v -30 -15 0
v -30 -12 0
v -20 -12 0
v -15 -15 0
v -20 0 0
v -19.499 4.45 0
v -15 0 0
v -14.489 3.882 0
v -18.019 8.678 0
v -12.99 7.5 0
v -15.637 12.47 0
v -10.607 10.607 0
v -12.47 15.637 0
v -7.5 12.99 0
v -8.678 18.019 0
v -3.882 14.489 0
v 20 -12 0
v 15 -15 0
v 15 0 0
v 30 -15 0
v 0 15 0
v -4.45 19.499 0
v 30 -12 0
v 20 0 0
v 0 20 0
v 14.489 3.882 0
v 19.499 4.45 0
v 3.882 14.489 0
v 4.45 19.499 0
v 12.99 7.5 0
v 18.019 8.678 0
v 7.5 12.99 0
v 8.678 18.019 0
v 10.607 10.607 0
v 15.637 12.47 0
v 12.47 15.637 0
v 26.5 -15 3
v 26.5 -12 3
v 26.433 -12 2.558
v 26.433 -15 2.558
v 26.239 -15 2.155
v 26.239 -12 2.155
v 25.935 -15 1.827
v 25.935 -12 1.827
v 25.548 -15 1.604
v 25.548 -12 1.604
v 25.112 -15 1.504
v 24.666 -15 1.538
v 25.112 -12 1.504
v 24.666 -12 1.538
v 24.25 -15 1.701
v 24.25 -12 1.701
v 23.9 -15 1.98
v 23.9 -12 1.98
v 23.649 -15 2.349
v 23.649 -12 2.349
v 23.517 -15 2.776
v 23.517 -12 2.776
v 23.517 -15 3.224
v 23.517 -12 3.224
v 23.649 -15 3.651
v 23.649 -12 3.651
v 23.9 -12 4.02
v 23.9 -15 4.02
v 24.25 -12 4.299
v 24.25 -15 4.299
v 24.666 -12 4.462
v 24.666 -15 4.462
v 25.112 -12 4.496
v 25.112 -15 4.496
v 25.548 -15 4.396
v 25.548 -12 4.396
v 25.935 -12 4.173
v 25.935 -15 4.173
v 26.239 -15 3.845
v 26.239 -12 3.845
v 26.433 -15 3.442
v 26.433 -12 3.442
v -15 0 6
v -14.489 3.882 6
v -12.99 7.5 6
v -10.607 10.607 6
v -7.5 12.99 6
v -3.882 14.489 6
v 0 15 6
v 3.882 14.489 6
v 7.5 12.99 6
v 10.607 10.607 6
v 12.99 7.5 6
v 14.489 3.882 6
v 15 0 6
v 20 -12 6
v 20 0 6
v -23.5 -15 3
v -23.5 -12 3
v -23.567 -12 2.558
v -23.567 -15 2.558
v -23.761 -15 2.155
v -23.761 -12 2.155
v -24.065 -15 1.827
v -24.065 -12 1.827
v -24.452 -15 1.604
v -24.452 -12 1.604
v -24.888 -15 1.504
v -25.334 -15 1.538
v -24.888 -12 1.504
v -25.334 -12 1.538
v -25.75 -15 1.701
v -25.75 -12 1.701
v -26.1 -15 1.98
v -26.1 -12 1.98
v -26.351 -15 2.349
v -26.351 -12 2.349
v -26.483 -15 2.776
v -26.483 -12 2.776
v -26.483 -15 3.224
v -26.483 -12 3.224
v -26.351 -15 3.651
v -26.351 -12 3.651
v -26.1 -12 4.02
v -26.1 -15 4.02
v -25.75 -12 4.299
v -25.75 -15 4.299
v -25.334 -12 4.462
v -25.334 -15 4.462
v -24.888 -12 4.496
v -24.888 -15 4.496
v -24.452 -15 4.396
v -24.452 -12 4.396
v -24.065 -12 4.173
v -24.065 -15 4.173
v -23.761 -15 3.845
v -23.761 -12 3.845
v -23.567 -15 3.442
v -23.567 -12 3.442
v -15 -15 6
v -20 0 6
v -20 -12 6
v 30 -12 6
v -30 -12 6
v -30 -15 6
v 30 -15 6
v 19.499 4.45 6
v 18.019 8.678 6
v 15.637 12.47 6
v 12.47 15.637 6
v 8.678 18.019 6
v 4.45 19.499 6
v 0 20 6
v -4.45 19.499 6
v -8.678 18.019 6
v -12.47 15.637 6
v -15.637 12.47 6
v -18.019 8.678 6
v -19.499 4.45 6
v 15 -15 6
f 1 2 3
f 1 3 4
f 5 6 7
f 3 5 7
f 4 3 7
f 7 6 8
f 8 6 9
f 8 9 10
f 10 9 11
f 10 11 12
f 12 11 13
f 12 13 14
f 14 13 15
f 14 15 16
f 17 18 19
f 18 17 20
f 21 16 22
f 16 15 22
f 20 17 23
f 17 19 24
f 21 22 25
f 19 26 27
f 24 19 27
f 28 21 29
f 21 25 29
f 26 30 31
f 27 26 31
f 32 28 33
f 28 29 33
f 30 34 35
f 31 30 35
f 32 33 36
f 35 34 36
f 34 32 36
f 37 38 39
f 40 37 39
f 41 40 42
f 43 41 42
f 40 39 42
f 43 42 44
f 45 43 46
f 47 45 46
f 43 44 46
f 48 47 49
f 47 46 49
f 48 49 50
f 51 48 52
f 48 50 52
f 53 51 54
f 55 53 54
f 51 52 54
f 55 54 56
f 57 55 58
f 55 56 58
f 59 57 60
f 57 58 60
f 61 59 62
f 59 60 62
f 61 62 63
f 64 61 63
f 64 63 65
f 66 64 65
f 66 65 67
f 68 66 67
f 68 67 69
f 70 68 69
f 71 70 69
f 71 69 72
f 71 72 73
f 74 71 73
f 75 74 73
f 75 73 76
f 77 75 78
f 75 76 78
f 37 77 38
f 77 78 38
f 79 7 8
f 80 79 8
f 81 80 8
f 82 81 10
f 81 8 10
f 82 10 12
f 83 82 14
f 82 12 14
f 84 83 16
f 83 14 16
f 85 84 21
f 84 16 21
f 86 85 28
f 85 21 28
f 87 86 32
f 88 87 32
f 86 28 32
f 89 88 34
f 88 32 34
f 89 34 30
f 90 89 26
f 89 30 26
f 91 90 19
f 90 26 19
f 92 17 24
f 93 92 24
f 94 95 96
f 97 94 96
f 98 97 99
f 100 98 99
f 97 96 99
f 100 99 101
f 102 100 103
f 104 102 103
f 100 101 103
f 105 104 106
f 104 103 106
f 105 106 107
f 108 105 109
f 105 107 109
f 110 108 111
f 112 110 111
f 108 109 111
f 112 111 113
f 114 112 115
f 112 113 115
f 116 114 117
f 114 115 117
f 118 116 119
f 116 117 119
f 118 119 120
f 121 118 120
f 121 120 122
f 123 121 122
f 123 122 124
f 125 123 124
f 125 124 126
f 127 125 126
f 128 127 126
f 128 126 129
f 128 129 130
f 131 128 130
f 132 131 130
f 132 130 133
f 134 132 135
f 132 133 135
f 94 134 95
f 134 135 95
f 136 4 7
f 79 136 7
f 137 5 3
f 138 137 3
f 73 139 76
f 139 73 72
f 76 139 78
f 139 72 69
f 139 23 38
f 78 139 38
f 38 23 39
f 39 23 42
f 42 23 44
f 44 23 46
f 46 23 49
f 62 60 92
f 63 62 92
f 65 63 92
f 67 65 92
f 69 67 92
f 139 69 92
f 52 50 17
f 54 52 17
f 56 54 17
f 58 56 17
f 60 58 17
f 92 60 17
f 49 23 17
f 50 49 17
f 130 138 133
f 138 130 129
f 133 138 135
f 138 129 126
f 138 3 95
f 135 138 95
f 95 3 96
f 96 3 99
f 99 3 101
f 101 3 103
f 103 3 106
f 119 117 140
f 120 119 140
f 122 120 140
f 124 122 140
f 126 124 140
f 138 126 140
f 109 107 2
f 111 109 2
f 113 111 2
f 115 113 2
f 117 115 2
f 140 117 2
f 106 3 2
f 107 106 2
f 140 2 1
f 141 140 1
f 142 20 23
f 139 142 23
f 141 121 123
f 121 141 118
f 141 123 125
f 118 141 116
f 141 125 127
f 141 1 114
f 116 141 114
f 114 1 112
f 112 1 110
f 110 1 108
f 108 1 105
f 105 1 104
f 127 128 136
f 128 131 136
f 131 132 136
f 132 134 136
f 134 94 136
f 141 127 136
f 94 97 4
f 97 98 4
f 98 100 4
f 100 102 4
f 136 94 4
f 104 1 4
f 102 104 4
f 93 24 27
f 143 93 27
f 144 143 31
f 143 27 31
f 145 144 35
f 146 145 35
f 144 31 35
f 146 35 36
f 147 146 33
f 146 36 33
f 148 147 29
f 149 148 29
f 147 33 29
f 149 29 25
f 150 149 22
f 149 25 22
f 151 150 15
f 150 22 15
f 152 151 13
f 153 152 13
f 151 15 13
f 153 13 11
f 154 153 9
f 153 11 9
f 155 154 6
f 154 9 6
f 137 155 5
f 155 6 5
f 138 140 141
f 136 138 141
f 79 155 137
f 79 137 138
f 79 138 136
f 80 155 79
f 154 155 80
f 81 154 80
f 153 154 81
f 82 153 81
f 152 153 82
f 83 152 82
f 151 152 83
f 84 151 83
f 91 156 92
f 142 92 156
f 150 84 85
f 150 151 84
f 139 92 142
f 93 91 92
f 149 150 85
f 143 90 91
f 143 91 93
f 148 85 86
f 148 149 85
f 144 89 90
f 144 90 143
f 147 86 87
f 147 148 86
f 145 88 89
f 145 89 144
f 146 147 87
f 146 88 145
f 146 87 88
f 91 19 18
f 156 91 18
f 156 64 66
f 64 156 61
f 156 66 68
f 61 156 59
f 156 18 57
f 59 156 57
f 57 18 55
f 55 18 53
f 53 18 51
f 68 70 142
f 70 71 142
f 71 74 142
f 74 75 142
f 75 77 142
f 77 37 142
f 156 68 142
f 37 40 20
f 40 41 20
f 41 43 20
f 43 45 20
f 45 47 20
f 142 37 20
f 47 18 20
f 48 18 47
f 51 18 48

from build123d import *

# Parameters (mm, degrees)
BOSS_EXTRUDE1_DEPTH = 6
SKETCH2_R           = 1.5
CUT_EXTRUDE1_DEPTH  = 3


with BuildPart() as part:
    # Sketch1 → Boss-Extrude1 (new body)
    with BuildSketch(Plane.XY):
        with BuildLine():
            Line((15, 0), (15, -15))
            Line((15, -15), (30, -15))
            Line((30, -15), (30, -12))
            Line((30, -12), (20, -12))
            Line((20, -12), (20, 0))
            ThreePointArc((20, 0), (0, 20), (-20, 0))
            Line((-20, 0), (-20, -12))
            Line((-20, -12), (-30, -12))
            Line((-30, -12), (-30, -15))
            Line((-30, -15), (-15, -15))
            Line((-15, -15), (-15, 0))
            ThreePointArc((-15, 0), (0, 15), (15, 0))
        make_face()
    extrude(amount=BOSS_EXTRUDE1_DEPTH)

    # Sketch2 → Cut-Extrude1 (cut)
    with BuildSketch(Plane(origin=(0, -12, 0), x_dir=(1, 0, 0), z_dir=(0, 1, 0))):
        with Locations((-25, -3)):
            Circle(SKETCH2_R)
        with Locations((25, -3)):
            Circle(SKETCH2_R)
    extrude(amount=-CUT_EXTRUDE1_DEPTH, mode=Mode.SUBTRACT)


solid = part.part
